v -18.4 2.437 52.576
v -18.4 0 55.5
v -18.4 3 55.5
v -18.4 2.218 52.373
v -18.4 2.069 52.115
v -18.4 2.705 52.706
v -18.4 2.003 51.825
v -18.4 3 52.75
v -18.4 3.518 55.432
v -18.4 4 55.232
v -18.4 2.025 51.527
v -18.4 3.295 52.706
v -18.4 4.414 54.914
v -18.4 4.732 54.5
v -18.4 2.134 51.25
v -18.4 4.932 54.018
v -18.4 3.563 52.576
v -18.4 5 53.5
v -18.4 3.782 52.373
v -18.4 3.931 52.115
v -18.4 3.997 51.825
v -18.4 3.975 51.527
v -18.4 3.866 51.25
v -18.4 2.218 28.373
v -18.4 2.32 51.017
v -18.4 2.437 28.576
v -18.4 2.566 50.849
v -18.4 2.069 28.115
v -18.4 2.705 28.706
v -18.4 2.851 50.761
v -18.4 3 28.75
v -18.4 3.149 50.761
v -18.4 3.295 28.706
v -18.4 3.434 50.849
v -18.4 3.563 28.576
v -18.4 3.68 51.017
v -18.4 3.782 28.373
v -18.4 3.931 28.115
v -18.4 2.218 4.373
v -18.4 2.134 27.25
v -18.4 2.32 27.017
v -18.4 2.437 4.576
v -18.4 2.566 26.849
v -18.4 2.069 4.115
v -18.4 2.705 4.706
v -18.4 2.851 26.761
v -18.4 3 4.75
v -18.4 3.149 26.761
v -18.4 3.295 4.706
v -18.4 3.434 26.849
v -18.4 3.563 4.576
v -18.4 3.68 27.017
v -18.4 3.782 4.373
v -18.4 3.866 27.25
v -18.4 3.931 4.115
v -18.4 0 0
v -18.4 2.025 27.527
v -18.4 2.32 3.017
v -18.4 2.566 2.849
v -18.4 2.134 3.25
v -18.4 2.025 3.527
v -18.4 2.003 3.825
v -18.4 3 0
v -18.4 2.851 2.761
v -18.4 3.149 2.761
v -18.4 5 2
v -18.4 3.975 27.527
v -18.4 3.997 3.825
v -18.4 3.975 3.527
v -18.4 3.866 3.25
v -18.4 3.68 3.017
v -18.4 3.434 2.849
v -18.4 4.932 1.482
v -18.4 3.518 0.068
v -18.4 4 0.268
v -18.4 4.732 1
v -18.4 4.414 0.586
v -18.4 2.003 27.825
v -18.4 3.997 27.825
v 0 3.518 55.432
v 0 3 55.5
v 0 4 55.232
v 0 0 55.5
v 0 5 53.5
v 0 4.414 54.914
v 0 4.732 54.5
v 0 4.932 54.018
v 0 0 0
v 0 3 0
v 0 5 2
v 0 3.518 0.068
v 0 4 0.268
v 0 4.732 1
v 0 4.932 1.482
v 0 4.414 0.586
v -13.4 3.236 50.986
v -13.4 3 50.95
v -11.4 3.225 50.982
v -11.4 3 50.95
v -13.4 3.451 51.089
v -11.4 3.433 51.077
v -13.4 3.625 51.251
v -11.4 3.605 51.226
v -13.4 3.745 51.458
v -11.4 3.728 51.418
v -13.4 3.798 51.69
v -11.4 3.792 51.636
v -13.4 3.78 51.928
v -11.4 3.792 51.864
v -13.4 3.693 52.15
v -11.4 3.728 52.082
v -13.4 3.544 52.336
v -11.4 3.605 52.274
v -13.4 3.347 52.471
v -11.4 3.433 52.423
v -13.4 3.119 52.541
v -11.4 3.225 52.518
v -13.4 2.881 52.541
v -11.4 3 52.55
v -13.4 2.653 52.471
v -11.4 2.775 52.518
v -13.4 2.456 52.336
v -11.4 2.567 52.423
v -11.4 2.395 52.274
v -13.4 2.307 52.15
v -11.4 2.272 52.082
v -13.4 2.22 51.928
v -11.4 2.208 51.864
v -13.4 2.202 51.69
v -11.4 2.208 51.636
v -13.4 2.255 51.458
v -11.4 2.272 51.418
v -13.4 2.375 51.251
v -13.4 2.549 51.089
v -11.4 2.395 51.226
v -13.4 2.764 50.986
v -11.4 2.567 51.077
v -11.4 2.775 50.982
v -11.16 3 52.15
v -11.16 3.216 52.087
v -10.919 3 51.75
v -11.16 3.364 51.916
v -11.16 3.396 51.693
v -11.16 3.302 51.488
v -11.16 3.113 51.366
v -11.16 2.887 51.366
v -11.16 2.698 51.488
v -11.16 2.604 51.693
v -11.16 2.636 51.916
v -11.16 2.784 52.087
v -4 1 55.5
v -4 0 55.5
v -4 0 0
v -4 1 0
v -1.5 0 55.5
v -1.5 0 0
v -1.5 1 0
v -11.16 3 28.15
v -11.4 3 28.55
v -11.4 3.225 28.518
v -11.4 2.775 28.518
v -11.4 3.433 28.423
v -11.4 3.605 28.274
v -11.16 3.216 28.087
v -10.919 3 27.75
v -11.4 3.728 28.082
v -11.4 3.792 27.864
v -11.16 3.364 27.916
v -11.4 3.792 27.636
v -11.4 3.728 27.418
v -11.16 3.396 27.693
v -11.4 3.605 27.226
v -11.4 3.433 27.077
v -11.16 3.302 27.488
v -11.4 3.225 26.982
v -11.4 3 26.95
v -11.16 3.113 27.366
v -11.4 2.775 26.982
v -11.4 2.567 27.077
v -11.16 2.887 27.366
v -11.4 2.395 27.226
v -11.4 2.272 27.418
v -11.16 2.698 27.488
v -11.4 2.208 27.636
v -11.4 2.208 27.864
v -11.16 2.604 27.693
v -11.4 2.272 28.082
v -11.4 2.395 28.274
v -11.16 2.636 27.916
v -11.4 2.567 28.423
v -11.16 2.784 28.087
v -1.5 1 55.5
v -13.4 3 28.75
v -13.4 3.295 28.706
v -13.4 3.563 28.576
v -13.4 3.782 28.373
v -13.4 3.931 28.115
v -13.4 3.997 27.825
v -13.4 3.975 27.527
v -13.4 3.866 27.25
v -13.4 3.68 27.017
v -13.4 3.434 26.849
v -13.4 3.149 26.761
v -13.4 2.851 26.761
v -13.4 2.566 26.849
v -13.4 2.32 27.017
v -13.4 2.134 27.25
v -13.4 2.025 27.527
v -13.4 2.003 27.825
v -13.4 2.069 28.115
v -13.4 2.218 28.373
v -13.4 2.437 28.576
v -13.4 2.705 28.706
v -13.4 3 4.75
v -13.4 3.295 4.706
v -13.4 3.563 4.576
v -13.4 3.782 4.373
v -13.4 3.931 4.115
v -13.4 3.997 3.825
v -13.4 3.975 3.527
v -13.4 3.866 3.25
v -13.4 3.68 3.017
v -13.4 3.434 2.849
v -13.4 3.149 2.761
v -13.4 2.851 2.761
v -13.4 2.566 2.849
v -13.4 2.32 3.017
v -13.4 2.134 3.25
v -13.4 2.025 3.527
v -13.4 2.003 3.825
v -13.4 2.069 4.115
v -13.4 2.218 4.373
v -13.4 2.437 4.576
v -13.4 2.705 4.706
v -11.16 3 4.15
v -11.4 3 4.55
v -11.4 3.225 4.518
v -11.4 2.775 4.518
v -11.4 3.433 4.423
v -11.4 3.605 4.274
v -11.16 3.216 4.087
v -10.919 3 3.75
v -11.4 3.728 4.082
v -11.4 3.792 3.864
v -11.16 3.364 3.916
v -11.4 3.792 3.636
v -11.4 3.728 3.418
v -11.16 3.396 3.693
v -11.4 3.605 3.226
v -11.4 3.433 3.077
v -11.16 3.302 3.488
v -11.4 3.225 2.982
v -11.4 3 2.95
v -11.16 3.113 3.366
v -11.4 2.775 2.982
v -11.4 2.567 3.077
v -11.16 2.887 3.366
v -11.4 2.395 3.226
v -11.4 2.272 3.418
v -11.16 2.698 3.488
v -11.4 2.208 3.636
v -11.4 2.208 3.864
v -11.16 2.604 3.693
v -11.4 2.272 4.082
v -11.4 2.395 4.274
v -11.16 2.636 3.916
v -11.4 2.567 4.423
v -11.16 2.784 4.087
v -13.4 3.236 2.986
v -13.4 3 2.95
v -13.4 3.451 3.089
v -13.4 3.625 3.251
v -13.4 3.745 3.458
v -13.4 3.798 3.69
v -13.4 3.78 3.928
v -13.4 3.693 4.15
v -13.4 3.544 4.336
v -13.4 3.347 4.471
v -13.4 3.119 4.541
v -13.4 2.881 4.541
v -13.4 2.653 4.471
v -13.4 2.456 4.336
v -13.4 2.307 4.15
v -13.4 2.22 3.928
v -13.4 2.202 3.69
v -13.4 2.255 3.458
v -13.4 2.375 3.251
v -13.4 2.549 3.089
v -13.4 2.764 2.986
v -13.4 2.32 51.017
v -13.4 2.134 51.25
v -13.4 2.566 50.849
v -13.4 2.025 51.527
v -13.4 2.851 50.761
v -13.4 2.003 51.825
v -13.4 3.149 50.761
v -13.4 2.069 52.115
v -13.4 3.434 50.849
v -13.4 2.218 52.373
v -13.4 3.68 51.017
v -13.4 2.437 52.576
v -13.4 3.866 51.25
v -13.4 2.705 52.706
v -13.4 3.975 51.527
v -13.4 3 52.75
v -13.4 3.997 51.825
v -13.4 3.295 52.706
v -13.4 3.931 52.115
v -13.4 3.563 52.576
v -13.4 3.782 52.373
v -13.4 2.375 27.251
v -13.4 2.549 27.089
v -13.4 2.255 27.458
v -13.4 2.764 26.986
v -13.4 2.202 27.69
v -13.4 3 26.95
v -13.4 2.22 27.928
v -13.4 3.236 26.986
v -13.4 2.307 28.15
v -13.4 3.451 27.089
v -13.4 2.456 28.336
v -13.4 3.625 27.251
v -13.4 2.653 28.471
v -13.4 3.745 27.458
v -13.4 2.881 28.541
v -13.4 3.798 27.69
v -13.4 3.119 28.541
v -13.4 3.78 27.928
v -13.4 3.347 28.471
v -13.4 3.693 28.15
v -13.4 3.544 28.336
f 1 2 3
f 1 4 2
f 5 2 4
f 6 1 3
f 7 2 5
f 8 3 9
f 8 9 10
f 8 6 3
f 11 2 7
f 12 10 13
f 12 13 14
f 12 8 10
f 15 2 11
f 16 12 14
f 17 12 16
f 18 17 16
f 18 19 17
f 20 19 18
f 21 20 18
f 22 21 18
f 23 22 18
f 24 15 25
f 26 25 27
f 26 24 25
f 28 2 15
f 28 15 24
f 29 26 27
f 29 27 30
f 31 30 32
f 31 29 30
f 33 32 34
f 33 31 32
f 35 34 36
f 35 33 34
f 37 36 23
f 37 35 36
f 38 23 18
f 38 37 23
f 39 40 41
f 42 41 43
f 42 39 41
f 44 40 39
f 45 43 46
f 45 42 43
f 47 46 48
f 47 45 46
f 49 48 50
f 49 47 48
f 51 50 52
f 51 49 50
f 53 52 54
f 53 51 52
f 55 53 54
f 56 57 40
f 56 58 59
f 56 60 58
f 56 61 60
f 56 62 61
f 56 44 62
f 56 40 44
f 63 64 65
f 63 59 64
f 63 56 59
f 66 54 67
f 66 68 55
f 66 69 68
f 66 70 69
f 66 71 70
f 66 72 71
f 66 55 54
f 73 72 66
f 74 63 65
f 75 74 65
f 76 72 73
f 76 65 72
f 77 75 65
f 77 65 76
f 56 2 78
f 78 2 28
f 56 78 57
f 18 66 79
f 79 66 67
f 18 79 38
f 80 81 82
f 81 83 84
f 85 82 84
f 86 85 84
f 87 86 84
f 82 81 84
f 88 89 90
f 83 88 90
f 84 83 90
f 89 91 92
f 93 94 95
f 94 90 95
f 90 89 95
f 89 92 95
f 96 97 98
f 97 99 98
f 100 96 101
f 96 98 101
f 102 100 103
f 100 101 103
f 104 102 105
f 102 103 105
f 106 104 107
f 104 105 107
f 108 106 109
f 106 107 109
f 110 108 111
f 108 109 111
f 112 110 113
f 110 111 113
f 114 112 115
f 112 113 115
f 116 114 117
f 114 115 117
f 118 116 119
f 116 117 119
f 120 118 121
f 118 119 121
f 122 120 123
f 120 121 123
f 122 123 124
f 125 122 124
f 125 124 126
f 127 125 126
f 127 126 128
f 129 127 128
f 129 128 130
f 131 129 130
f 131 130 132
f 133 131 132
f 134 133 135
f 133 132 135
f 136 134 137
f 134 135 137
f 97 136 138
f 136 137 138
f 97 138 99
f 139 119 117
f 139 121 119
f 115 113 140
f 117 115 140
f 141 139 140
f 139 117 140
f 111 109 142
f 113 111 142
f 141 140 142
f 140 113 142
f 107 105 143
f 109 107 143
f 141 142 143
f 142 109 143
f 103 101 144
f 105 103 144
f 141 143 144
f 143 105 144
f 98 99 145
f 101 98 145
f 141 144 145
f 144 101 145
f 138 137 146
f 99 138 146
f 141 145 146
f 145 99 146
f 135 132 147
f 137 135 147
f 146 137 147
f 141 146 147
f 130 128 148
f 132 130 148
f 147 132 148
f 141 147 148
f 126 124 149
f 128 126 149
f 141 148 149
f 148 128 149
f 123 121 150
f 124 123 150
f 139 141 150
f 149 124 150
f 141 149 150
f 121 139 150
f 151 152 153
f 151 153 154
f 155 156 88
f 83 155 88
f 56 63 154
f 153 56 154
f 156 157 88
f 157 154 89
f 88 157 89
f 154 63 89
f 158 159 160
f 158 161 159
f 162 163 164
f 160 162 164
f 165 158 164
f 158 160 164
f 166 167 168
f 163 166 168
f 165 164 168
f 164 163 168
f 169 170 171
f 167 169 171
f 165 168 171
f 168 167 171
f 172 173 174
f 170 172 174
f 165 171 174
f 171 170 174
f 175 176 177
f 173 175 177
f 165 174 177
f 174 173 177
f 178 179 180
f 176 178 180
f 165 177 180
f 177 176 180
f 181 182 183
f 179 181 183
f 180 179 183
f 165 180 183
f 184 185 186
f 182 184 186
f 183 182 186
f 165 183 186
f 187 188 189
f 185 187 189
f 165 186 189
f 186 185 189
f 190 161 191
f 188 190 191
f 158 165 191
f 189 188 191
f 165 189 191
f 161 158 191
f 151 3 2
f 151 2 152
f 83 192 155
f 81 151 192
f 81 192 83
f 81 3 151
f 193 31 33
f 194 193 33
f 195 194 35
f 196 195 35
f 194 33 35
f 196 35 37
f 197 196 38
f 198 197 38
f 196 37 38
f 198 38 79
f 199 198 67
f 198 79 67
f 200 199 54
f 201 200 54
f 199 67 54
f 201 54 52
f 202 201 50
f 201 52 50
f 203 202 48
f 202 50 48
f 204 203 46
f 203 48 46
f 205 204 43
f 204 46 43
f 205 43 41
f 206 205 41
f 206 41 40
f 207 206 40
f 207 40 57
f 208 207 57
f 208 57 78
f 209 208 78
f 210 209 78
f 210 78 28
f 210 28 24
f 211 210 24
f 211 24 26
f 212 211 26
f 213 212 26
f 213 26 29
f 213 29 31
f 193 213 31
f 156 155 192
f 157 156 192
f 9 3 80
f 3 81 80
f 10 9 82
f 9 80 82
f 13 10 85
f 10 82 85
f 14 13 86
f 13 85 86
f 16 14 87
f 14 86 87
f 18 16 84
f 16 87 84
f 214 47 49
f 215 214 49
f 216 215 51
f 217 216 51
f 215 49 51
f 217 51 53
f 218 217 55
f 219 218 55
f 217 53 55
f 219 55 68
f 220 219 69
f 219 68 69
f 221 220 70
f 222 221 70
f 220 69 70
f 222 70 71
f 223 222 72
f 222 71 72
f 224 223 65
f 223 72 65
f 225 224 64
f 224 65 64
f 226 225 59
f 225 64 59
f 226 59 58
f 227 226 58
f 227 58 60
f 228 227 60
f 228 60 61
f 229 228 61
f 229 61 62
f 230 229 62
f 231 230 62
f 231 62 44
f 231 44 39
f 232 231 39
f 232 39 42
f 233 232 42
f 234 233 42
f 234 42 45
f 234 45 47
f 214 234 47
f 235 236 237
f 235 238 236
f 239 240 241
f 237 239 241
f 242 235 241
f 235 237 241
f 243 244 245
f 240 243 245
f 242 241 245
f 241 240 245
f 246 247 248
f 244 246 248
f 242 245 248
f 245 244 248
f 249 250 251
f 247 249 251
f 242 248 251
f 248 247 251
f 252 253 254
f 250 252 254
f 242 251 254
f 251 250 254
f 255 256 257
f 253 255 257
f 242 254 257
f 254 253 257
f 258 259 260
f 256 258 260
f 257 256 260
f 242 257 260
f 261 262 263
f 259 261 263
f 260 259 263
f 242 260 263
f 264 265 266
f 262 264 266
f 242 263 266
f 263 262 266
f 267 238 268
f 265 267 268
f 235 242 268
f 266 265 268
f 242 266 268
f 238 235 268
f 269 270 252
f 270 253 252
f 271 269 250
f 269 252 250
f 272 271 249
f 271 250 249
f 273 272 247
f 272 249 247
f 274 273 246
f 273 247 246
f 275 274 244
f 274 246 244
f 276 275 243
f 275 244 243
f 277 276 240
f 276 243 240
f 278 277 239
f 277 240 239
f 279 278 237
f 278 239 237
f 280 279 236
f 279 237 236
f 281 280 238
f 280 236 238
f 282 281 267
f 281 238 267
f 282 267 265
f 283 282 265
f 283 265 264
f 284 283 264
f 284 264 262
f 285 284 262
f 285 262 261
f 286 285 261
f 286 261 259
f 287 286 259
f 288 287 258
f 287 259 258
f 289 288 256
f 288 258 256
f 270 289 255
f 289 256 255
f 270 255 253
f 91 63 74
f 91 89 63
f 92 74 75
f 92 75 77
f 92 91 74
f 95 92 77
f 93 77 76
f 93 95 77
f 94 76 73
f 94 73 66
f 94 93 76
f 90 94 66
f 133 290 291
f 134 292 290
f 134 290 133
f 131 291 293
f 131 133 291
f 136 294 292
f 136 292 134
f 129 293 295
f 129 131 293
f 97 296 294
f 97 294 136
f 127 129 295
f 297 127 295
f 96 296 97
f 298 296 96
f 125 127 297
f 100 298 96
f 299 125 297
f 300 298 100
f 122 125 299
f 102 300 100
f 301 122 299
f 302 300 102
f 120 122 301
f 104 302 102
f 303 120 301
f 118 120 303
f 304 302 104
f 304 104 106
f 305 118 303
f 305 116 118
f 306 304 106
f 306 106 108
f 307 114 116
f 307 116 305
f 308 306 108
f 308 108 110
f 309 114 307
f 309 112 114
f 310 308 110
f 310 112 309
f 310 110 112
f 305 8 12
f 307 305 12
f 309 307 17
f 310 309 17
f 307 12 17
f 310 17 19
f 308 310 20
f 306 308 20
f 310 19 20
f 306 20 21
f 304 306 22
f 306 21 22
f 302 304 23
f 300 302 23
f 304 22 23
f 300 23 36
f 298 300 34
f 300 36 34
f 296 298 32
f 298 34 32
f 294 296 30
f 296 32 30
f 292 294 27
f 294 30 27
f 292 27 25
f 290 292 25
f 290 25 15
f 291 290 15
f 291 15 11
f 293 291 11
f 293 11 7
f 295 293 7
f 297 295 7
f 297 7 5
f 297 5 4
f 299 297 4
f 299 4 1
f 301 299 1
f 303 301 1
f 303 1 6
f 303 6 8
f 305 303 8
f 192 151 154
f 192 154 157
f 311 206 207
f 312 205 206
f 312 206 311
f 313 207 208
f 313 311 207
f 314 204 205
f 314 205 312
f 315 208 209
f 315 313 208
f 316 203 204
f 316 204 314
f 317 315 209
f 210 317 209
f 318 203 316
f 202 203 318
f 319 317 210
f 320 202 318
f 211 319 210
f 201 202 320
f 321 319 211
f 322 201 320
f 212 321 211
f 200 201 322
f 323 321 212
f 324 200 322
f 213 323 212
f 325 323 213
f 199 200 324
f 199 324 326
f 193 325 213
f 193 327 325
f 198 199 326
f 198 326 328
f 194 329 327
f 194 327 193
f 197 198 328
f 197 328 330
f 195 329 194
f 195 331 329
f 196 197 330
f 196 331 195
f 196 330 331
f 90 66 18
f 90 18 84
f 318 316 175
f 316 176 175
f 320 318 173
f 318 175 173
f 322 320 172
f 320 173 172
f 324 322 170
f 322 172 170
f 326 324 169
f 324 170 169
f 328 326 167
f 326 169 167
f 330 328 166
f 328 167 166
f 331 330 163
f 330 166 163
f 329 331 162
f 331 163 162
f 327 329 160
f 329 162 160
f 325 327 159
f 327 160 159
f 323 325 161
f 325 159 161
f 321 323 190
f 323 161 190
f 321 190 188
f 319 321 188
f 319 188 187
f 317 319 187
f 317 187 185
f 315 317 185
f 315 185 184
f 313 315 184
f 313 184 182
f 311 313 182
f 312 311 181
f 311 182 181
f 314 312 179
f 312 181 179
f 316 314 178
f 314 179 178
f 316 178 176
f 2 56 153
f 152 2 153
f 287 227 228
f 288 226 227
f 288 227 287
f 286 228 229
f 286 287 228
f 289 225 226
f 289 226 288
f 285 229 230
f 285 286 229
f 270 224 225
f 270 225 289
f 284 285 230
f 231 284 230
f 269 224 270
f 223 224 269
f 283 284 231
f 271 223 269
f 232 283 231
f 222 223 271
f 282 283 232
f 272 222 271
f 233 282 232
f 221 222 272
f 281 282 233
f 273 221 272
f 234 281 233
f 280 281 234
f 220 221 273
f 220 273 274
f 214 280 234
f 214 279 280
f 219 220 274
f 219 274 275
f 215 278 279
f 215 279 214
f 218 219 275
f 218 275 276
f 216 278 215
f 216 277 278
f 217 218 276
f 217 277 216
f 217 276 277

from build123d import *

# Parameters (mm, degrees)
SKETCH1_W                       = 18.4
SKETCH1_H                       = 5
BOSS_EXTRUDE1_DEPTH             = 55.5
SKETCH2_W                       = 2.5
SKETCH2_H                       = 1
CUT_EXTRUDE1_DEPTH              = 56.5
M2X0_4_TAPPED_HOLE1_D           = 1.6
M2X0_4_TAPPED_HOLE1_DEPTH       = 7
M2X0_4_TAPPED_HOLE1_CBORE_D     = 2
M2X0_4_TAPPED_HOLE1_CBORE_DEPTH = 5
M2X0_4_TAPPED_HOLE1_TIP         = 0.480688495
FILLET1_R                       = 2


with BuildPart() as part:
    # Sketch1 → Boss-Extrude1 (new body)
    with BuildSketch(Plane.XY):
        with Locations((-9.2, 2.5)):
            Rectangle(SKETCH1_W, SKETCH1_H)
    extrude(amount=BOSS_EXTRUDE1_DEPTH)

    # Sketch2 → Cut-Extrude1 (cut, through all)
    with BuildSketch(Plane.XY.offset(55.5)):
        with Locations((-2.75, 0.5)):
            Rectangle(SKETCH2_W, SKETCH2_H)
    extrude(amount=-CUT_EXTRUDE1_DEPTH, mode=Mode.SUBTRACT)

    # M2x0.4 Tapped Hole1
    with Locations(Plane.ZY.offset(18.4)):
        with Locations((51.75, 3), (27.75, 3), (3.75, 3)):
            CounterBoreHole(M2X0_4_TAPPED_HOLE1_D / 2, M2X0_4_TAPPED_HOLE1_CBORE_D / 2, M2X0_4_TAPPED_HOLE1_CBORE_DEPTH, depth=M2X0_4_TAPPED_HOLE1_DEPTH)
            with Locations((0, 0, -(M2X0_4_TAPPED_HOLE1_DEPTH + M2X0_4_TAPPED_HOLE1_TIP / 2))):  # 118° drill point
                Cone(0, M2X0_4_TAPPED_HOLE1_D / 2, M2X0_4_TAPPED_HOLE1_TIP, mode=Mode.SUBTRACT)

    # Fillet1
    fillet1_edges = [part.edges().sort_by_distance(p)[0] for p in [
        (-9.2, 5, 0),
        (-9.2, 5, 55.5),
    ]]
    fillet(fillet1_edges, radius=FILLET1_R)


solid = part.part
